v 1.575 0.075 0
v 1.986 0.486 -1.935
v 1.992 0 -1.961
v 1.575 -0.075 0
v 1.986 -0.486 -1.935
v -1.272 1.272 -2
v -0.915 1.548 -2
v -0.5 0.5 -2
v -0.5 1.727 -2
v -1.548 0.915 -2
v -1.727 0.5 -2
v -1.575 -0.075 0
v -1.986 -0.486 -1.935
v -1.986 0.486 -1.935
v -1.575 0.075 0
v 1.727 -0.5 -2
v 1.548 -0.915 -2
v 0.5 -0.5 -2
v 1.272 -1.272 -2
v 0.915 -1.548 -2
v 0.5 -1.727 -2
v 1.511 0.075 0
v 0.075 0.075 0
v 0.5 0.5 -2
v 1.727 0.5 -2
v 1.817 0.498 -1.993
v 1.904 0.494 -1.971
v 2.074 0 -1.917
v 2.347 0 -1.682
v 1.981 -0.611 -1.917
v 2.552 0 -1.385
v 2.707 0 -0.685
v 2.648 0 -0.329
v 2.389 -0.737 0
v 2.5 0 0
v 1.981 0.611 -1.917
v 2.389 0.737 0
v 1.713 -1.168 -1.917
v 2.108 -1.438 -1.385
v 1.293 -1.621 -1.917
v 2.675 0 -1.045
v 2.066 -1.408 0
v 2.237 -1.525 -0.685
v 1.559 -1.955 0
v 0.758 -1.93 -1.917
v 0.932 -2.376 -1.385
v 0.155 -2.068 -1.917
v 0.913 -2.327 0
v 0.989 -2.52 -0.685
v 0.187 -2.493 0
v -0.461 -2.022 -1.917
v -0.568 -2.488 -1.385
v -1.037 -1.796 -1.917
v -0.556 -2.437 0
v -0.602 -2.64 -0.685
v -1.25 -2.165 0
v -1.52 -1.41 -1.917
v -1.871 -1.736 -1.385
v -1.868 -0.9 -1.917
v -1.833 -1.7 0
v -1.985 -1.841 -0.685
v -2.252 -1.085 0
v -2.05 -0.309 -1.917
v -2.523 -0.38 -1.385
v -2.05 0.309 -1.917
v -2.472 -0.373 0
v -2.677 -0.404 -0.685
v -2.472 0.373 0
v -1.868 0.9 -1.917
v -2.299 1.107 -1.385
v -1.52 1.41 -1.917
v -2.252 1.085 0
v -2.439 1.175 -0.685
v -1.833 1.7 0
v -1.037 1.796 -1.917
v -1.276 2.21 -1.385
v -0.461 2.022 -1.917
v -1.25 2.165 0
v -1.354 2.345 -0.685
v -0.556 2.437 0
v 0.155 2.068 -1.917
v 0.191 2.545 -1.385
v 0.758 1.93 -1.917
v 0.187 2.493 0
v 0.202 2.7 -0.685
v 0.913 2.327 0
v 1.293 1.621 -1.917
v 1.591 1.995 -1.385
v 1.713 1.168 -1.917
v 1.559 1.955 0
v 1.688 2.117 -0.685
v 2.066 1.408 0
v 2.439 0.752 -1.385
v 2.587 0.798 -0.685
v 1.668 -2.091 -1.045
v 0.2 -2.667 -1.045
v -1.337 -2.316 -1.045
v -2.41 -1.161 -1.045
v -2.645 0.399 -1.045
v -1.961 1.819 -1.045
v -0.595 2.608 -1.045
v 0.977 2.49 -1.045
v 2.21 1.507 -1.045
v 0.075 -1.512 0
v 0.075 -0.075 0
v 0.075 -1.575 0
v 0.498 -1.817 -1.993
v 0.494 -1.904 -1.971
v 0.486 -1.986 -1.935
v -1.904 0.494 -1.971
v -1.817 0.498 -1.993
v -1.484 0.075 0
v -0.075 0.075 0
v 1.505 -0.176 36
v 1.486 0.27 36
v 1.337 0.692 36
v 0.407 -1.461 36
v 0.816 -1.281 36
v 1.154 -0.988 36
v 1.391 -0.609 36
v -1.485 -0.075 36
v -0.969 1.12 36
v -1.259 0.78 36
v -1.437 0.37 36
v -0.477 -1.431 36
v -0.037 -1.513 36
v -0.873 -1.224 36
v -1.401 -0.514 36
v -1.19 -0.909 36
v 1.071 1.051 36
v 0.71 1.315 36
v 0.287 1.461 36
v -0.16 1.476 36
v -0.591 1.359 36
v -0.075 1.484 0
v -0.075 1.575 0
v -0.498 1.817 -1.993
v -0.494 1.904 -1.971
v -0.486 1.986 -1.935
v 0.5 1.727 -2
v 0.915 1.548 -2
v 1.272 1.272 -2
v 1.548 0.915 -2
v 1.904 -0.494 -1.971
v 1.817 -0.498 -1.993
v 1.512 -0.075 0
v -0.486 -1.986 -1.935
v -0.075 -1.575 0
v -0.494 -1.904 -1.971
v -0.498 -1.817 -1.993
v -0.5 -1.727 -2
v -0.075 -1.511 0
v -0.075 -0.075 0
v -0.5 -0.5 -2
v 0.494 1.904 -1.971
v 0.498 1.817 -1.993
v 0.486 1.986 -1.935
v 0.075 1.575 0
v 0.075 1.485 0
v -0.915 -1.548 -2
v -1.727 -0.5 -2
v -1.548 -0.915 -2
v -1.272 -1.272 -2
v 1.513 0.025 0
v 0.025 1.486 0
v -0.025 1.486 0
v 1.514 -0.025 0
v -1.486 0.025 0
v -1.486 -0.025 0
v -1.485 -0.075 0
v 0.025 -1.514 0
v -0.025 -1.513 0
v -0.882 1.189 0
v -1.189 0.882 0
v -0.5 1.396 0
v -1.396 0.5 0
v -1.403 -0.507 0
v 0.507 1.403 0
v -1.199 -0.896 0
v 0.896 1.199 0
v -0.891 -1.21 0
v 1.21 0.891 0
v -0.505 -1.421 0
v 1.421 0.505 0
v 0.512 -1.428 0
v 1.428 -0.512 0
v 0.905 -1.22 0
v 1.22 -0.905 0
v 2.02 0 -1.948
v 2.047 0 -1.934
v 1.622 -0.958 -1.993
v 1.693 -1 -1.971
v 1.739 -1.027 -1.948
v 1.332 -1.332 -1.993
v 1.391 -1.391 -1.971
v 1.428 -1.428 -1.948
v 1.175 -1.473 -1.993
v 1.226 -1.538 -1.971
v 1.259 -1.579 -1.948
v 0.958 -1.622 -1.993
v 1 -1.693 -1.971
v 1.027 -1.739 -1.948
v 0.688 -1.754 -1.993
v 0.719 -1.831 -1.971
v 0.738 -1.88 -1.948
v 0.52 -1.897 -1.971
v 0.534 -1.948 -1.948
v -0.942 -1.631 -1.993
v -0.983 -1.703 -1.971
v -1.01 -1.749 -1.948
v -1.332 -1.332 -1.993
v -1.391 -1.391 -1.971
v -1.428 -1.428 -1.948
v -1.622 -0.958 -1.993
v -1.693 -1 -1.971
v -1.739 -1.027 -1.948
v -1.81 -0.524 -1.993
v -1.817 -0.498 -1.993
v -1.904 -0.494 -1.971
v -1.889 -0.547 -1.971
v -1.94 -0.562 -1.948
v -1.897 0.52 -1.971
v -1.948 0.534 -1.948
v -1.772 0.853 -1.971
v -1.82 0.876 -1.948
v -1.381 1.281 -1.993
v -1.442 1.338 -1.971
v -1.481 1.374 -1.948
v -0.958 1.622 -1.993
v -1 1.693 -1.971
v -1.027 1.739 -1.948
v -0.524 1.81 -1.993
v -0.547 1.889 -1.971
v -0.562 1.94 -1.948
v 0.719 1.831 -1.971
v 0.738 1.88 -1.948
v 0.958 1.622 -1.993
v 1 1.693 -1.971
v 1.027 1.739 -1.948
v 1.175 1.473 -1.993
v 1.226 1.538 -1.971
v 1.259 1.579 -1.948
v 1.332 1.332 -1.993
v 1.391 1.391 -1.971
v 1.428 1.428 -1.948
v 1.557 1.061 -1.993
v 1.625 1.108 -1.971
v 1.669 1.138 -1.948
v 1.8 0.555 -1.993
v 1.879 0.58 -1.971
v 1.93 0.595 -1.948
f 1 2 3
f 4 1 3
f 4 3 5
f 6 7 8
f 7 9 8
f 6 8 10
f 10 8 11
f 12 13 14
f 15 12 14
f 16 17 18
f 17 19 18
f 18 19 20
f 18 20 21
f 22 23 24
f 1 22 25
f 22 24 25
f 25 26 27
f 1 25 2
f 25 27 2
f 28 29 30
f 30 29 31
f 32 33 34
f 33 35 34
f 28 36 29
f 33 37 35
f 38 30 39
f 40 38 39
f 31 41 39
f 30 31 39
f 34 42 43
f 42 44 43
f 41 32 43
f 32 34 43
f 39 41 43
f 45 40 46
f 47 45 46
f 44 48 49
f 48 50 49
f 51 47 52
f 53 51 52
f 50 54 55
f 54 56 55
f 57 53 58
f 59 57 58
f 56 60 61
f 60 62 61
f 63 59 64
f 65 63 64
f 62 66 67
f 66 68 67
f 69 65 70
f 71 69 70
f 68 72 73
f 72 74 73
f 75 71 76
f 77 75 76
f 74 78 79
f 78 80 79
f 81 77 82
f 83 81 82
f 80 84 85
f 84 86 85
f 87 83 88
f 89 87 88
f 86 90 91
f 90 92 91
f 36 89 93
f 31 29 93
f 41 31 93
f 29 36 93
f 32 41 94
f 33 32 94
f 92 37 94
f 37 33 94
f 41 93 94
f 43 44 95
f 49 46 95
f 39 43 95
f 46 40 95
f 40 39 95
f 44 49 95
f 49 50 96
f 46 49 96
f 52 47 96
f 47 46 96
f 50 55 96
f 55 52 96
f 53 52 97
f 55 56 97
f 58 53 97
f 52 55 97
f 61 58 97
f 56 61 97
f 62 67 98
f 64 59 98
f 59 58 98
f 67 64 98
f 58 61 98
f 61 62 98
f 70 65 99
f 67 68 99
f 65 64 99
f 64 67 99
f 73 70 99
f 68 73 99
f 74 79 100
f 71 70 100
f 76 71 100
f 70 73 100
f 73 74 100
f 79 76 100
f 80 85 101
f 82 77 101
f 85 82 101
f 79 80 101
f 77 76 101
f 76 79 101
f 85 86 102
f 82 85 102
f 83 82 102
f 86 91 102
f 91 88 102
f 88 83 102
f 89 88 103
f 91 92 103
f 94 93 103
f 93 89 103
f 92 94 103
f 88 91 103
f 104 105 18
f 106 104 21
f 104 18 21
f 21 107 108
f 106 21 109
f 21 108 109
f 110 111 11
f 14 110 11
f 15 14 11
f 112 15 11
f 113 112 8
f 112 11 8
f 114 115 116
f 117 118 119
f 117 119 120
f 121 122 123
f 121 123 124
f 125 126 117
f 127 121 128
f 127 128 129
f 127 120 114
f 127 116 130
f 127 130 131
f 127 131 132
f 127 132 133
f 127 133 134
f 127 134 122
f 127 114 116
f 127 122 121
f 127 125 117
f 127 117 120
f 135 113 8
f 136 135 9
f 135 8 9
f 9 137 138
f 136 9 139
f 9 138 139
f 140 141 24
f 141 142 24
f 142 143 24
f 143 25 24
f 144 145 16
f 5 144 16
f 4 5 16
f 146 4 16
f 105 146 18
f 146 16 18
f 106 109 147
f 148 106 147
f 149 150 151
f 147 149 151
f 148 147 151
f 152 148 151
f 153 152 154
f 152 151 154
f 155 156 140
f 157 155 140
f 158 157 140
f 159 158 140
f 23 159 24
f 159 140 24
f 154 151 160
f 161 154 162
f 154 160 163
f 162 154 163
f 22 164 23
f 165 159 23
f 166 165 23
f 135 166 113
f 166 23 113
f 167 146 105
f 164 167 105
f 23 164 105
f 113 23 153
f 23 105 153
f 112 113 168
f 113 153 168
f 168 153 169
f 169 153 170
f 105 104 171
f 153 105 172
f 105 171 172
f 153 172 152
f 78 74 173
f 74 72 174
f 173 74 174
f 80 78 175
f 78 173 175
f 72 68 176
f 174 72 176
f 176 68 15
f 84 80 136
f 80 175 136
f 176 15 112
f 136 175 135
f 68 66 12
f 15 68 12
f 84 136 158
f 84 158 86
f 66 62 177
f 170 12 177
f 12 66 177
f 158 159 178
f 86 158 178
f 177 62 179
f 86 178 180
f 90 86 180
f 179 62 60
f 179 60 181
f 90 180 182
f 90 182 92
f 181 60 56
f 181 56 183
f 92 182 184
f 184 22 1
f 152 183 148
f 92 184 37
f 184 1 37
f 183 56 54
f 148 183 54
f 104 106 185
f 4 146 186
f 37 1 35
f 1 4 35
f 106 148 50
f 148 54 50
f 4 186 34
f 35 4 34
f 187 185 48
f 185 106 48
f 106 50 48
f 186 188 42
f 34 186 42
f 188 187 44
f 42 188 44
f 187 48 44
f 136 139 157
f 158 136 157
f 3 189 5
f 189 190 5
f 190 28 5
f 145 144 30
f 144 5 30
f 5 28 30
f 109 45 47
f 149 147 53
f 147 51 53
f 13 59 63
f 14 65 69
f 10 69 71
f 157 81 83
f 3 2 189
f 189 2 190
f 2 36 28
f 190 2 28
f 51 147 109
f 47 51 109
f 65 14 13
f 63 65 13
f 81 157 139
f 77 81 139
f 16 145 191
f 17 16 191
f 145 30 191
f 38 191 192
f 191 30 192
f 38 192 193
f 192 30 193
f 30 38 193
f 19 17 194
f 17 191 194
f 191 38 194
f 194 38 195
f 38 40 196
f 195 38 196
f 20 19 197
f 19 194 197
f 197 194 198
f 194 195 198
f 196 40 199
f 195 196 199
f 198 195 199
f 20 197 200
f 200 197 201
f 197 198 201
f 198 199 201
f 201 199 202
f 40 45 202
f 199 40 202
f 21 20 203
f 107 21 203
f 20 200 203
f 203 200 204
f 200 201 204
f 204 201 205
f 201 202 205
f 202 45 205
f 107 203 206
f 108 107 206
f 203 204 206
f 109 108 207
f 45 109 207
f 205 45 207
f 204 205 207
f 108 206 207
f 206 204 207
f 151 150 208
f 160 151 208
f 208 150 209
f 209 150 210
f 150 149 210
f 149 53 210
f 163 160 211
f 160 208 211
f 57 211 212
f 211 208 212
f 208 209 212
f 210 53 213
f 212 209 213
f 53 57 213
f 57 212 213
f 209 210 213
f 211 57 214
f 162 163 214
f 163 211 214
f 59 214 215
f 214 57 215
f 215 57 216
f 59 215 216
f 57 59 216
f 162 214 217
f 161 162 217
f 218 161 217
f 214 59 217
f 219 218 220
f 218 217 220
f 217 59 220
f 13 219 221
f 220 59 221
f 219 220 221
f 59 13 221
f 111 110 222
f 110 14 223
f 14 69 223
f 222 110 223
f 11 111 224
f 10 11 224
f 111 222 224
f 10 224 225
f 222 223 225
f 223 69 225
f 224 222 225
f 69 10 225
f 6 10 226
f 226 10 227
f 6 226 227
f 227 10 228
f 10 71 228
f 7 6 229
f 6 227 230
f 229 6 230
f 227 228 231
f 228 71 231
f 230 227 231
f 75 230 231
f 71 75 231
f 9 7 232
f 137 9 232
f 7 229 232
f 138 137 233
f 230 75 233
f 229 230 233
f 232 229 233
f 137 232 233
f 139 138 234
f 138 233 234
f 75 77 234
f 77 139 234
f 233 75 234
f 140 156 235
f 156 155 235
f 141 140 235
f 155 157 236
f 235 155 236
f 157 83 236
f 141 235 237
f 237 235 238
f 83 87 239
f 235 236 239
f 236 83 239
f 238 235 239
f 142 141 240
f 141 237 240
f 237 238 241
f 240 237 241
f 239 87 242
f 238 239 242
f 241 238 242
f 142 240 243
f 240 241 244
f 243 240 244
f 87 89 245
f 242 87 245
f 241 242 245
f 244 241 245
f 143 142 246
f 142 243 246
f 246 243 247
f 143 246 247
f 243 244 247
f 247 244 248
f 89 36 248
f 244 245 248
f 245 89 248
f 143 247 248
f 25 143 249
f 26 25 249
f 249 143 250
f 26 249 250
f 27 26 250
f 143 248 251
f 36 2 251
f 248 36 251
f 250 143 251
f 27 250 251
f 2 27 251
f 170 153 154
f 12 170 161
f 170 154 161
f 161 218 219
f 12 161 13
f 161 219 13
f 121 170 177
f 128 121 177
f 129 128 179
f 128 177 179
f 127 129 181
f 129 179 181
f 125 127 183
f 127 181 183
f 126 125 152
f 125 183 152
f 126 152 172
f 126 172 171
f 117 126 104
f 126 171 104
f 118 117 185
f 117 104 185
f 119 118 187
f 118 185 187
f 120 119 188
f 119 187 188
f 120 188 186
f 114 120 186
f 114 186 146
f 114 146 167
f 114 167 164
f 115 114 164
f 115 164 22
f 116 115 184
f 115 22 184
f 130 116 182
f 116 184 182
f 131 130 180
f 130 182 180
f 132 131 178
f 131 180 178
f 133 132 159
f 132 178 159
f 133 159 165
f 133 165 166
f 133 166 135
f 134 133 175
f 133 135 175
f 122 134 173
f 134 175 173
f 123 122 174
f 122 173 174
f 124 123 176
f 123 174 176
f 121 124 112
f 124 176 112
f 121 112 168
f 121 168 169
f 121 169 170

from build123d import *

# Parameters (mm, degrees)
CUT_EXTRUDE1_DEPTH  = 2
CUT_EXTRUDE1_DRAFT  = -12
SKETCH3_R           = 1.5
BOSS_EXTRUDE1_DEPTH = 36


with BuildPart() as part:
    # Sketch1 → Revolve2 (revolve)
    with BuildSketch(Plane(origin=(0, 0, 0), x_dir=(1, 0, 0), z_dir=(0, 1, 0))):
        with BuildLine():
            Line((0, 0), (0, 2))
            Line((0, 2), (1.798285661, 2))
            ThreePointArc((1.798285661, 2), (1.941964308, 1.978911731), (2.07352322, 1.917425786))
            ThreePointArc((2.07352322, 1.917425786), (2.674697589, 1.044998208), (2.5, 0))
            Line((2.5, 0), (0, 0))
        make_face()
    revolve(axis=Axis((0, 0, -0.65925001), (0, 0, -1)))


with BuildPart() as cut_extrude1_tool:
    # Sketch2 → Cut-Extrude1 (with draft: the straight prism first)
    with BuildSketch(Plane(origin=(0, 0, -2), x_dir=(-1, 0, 0), z_dir=(0, 0, -1))):
        Polygon((0.5, -0.5), (2, -0.5), (2, 0.5), (0.5, 0.5), (0.5, 2), (-0.5, 2), (-0.5, 0.5), (-2, 0.5), (-2, -0.5), (-0.5, -0.5), (-0.5, -2), (0.5, -2), align=None)
    extrude(amount=-CUT_EXTRUDE1_DEPTH)
    # Cut-Extrude1: the draft: its side faces are tilted about the plane it starts from
    cut_extrude1_sides = [cut_extrude1_tool.faces().sort_by_distance(p)[0] for p in [
        (-1.25, -0.5, -1),
        (-2, 0, -1),
        (-1.25, 0.5, -1),
        (-0.5, 1.25, -1),
        (0, 2, -1),
        (0.5, 1.25, -1),
        (1.25, 0.5, -1),
        (2, 0, -1),
        (1.25, -0.5, -1),
        (0.5, -1.25, -1),
        (0, -2, -1),
        (-0.5, -1.25, -1),
    ]]
    draft(cut_extrude1_sides, Plane(origin=(0, 0, -2), x_dir=(-1, 0, 0), z_dir=(0, 0, -1)), CUT_EXTRUDE1_DRAFT)


with BuildPart() as part_1:
    add(part.part)

    # Cut-Extrude1: cut by cut_extrude1_tool
    add(cut_extrude1_tool.part, mode=Mode.SUBTRACT)

    # Sketch3 → Boss-Extrude1 (add)
    with BuildSketch(Plane.XY):
        with Locations(Location((0.013589602, -0.013589602, 0), (0, 0, 182.342035556))):
            Circle(SKETCH3_R)
    extrude(amount=BOSS_EXTRUDE1_DEPTH)


solid = part_1.part
